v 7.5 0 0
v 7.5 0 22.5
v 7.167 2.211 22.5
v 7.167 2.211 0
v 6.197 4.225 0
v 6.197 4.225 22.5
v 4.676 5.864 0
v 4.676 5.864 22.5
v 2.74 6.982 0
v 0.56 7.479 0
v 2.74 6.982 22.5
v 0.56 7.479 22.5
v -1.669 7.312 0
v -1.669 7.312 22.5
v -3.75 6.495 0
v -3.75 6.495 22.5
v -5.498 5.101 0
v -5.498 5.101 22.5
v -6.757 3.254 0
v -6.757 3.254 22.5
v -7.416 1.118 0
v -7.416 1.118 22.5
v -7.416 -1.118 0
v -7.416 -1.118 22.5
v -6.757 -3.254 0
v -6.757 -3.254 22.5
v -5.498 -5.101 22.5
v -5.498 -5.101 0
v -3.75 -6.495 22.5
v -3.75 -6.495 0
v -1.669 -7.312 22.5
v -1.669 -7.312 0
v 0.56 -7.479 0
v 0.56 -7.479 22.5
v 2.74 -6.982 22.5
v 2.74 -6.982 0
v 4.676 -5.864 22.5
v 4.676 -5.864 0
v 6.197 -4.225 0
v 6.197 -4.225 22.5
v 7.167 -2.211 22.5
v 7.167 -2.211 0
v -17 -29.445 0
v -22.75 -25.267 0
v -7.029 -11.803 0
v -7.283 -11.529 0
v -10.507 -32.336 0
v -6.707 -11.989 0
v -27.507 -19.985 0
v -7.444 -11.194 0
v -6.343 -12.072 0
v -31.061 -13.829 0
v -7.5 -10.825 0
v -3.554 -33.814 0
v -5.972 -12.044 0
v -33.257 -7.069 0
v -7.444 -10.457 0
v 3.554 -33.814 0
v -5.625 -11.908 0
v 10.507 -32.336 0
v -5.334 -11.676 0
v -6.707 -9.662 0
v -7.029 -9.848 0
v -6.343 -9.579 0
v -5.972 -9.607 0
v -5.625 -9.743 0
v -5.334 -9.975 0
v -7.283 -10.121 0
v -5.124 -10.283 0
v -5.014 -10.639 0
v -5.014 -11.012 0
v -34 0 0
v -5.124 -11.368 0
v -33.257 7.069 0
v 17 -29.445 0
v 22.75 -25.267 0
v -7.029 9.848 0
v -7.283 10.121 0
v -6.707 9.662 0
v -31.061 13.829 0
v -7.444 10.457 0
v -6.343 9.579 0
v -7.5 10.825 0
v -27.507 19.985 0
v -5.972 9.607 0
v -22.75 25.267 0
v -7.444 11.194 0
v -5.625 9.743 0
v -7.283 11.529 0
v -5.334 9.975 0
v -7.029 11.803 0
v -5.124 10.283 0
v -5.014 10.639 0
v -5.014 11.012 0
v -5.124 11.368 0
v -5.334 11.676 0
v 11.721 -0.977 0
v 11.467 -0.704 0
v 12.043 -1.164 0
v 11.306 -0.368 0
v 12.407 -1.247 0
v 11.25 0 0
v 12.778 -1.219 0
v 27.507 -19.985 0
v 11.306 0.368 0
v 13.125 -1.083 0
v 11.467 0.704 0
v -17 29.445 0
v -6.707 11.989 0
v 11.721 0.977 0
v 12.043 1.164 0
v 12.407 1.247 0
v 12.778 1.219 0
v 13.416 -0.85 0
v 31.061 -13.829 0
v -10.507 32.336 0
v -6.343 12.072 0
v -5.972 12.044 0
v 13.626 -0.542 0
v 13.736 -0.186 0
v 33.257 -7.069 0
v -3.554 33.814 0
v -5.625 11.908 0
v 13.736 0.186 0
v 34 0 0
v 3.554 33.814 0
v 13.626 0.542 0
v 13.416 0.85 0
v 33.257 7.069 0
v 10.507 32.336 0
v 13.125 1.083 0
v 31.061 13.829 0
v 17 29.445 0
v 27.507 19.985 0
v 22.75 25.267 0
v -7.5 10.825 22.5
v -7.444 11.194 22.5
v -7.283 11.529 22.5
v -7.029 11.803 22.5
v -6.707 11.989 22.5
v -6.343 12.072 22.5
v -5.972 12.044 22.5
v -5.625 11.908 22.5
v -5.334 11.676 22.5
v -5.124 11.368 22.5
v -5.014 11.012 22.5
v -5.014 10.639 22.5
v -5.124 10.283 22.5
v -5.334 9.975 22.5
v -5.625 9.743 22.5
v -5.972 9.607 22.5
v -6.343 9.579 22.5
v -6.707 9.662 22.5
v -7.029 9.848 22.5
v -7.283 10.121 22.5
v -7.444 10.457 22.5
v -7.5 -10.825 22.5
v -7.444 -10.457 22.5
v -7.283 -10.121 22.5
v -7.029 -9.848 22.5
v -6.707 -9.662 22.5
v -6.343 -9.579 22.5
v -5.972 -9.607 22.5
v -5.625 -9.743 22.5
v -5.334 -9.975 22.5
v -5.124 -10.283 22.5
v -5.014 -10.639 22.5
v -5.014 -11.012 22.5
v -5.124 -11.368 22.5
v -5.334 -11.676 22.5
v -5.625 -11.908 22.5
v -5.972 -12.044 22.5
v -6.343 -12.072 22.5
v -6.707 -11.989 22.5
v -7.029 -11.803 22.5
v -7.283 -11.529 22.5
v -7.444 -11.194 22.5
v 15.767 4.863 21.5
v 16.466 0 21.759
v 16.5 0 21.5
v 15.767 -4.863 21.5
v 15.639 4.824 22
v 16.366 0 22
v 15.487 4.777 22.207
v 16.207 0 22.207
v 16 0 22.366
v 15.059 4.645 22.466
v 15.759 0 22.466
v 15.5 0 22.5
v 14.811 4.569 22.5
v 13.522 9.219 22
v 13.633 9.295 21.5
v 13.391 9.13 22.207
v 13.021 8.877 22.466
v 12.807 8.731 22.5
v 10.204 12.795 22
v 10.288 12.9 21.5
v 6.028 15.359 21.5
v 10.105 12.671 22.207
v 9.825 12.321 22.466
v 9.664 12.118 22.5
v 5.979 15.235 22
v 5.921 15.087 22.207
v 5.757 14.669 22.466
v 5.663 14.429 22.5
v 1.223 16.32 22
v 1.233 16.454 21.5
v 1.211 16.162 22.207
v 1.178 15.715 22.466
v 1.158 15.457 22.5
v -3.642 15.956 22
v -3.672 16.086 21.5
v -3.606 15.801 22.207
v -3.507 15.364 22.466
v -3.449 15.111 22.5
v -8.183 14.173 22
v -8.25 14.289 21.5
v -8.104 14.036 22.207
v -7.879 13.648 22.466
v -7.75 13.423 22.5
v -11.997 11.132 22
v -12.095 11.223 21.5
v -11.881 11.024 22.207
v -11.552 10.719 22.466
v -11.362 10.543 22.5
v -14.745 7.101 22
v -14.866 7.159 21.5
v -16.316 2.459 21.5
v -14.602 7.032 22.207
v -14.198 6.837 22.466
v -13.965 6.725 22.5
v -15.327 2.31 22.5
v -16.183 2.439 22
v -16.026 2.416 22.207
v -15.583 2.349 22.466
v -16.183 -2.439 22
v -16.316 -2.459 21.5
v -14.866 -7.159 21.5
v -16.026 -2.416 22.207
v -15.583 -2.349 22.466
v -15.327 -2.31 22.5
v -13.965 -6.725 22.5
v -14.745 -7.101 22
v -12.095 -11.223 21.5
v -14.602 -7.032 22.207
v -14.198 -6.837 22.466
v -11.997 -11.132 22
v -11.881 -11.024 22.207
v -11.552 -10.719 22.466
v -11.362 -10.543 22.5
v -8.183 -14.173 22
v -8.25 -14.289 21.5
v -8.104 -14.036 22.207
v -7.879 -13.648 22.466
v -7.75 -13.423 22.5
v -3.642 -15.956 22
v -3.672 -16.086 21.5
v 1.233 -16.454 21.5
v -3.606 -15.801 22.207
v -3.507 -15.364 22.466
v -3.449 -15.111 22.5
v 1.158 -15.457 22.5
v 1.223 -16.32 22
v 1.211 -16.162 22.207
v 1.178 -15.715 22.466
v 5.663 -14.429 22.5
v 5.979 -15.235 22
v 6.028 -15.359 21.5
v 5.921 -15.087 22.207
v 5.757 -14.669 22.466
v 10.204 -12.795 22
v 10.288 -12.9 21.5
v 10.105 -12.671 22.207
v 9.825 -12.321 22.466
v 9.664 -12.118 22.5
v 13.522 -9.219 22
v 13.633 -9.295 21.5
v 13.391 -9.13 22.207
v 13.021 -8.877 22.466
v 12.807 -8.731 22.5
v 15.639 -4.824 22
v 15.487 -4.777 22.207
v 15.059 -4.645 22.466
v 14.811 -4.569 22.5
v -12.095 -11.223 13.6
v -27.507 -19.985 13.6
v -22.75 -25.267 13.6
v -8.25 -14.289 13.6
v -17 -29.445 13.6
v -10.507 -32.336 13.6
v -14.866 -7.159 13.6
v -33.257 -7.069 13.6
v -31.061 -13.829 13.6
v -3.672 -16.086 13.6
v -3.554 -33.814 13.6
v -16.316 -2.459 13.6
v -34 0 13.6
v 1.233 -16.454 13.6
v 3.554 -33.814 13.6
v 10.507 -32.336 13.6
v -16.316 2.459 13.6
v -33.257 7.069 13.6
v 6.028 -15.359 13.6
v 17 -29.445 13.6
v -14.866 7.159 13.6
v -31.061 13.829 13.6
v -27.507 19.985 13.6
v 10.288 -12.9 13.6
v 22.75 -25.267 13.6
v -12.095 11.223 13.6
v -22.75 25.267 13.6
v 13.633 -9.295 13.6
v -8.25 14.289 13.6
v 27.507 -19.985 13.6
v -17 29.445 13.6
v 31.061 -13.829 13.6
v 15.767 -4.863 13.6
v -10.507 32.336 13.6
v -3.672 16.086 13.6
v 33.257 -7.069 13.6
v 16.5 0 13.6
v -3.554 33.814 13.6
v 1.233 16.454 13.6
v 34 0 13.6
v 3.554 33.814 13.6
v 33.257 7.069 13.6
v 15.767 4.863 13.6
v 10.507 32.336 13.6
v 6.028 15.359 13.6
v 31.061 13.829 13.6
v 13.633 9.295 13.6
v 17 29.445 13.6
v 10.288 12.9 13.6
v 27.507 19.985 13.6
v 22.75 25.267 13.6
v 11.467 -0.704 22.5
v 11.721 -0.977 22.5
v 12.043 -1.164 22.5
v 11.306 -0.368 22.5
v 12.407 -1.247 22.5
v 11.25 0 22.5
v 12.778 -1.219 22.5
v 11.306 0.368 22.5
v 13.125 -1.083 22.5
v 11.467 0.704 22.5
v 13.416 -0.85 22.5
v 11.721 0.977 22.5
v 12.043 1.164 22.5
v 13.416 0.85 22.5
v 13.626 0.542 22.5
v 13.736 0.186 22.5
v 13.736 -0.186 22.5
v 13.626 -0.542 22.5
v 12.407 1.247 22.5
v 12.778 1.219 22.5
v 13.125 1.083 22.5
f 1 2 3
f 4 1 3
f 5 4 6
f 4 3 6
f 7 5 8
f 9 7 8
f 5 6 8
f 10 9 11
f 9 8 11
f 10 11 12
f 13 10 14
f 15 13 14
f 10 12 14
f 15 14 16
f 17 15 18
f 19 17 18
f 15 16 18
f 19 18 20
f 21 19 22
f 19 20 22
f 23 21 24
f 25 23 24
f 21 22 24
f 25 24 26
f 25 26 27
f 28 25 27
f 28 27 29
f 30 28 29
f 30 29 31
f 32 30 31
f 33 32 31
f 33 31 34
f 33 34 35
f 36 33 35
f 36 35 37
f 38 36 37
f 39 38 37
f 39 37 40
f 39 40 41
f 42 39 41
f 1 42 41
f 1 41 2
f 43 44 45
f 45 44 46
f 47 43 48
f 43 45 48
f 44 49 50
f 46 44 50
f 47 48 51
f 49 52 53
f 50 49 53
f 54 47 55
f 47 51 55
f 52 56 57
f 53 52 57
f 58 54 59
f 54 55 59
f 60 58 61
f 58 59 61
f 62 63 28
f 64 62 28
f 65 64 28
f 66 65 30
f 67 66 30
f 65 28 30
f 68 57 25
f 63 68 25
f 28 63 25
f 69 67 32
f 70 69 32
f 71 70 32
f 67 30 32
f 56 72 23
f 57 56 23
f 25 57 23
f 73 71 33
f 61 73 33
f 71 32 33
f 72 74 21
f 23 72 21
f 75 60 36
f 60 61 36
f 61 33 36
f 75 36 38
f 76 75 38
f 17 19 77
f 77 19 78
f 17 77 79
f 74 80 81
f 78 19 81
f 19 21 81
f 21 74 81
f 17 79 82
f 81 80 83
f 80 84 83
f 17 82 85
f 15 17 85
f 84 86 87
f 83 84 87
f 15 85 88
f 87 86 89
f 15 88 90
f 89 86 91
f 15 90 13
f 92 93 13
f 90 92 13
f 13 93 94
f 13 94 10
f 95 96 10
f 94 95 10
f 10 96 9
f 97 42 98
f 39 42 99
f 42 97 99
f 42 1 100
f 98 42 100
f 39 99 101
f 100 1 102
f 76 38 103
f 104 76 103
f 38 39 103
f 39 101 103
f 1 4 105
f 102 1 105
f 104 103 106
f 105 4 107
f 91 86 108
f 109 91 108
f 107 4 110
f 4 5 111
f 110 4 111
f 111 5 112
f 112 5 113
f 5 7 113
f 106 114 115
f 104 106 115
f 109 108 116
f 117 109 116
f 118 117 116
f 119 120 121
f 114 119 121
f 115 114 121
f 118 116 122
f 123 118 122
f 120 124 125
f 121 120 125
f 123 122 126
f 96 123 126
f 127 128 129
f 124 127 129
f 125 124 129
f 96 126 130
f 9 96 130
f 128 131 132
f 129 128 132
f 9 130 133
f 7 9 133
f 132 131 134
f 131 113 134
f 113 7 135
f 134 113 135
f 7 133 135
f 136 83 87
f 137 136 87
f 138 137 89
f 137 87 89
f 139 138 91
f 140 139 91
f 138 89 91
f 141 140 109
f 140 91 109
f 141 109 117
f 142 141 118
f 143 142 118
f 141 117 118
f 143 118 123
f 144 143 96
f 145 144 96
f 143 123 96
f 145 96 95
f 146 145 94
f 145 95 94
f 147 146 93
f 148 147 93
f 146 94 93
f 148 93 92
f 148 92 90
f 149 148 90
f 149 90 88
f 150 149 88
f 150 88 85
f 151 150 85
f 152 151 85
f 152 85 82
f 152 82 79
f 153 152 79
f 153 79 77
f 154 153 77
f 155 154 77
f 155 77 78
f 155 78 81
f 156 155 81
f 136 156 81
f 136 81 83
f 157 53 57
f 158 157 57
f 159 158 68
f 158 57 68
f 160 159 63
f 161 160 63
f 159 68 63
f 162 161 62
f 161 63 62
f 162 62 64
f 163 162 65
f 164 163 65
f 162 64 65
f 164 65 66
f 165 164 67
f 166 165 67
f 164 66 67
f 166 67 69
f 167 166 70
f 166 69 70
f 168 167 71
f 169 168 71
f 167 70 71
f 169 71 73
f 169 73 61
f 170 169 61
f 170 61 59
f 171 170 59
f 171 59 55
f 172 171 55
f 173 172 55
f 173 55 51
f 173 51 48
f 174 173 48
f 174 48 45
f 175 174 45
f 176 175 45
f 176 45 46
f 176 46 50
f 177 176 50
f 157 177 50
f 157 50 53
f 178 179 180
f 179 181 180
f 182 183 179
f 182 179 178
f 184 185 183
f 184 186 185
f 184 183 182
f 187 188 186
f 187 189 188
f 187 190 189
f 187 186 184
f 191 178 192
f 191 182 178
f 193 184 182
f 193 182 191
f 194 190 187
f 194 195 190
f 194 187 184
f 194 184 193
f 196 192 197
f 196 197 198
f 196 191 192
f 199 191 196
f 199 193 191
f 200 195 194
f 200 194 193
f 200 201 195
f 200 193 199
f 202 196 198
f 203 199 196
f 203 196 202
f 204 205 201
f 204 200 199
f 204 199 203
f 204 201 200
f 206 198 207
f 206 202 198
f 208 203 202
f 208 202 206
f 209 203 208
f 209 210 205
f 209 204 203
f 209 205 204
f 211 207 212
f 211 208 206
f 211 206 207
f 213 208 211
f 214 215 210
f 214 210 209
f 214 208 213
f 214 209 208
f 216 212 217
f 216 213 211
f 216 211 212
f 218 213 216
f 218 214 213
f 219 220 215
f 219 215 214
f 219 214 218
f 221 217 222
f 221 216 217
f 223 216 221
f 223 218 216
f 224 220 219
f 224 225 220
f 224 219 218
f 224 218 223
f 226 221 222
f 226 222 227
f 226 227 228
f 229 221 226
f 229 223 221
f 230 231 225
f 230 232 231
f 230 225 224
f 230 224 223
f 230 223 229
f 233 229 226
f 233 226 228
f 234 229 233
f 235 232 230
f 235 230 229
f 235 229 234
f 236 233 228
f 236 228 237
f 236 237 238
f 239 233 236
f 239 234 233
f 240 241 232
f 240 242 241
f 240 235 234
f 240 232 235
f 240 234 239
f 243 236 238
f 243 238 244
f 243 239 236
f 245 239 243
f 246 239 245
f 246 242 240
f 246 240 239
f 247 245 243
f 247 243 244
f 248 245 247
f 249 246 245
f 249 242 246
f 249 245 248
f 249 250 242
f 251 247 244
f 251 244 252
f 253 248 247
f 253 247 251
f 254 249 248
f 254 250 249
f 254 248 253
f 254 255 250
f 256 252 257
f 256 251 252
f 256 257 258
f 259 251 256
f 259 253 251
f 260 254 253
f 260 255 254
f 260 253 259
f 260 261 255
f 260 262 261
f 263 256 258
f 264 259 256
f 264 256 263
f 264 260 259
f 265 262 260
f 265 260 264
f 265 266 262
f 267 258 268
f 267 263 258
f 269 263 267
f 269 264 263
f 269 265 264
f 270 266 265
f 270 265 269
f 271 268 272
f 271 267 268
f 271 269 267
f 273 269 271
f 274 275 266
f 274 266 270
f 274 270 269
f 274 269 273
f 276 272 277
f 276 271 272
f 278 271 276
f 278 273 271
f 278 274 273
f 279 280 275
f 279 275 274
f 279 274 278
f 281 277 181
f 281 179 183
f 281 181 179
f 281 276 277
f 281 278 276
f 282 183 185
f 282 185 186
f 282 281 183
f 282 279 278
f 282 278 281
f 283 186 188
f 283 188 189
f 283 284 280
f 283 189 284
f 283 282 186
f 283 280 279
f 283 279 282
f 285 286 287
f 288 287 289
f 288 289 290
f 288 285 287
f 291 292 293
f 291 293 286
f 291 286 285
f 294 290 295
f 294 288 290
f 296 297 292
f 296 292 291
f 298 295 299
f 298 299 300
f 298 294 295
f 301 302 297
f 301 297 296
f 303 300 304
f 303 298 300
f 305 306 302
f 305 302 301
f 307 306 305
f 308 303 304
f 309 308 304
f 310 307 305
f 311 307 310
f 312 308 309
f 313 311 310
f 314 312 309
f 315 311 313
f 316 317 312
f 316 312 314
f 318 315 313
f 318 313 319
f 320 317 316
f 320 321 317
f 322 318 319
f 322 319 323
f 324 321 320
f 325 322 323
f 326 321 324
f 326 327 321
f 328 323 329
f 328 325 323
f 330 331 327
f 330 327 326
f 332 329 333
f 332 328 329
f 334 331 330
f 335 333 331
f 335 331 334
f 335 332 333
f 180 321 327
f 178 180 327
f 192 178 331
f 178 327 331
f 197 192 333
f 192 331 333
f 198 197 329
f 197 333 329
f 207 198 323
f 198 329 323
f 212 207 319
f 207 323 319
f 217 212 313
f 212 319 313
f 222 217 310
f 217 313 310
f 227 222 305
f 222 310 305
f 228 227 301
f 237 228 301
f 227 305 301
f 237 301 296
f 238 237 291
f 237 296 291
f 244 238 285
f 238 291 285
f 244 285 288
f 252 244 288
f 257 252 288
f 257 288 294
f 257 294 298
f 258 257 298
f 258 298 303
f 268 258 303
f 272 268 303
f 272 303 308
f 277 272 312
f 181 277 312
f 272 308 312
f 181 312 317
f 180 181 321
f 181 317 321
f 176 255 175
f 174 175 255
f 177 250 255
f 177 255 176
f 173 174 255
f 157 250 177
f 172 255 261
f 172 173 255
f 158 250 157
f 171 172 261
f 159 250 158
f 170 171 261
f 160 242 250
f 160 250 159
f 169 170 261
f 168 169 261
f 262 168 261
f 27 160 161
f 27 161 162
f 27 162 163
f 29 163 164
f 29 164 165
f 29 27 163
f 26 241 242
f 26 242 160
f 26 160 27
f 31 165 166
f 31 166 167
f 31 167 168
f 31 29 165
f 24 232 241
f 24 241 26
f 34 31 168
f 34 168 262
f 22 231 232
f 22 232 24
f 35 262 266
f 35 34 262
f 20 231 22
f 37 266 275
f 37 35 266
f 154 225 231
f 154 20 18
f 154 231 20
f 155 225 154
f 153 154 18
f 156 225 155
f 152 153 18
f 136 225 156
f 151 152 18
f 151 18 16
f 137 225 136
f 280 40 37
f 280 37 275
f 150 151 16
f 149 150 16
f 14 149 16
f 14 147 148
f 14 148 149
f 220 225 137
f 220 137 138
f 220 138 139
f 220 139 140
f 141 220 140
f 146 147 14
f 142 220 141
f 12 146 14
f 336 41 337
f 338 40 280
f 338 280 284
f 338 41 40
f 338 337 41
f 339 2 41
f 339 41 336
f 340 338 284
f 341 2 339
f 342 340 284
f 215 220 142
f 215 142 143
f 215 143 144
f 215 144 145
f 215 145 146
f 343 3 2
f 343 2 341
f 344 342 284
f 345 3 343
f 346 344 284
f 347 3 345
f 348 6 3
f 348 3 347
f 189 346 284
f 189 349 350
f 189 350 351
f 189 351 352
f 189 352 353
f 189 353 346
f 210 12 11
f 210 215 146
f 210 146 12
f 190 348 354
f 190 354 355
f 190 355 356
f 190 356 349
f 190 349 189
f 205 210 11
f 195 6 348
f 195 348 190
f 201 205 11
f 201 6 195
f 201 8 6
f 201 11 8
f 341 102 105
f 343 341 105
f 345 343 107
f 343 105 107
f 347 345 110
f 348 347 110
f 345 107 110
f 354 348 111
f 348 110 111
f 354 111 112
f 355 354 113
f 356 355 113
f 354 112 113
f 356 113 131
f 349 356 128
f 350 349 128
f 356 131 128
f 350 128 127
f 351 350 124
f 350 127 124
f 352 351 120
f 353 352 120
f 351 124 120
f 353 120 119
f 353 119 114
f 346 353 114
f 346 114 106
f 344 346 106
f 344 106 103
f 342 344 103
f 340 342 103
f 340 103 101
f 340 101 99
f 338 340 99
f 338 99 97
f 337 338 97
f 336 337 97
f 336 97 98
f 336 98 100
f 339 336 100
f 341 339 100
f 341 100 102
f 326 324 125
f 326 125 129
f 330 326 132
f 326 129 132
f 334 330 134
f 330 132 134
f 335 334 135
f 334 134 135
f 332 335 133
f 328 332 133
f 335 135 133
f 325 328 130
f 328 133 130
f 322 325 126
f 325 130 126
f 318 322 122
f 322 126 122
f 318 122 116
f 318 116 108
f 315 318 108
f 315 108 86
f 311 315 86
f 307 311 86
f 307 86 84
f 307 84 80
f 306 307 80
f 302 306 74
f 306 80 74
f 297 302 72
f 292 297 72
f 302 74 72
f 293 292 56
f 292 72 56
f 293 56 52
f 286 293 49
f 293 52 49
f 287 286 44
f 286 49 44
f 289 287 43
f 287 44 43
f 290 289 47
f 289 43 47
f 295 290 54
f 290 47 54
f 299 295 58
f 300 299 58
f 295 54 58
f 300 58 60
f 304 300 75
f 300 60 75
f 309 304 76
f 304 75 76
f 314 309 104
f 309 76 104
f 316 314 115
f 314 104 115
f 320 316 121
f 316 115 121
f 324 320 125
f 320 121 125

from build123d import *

# Parameters (mm, degrees)
SKETCH_1_R          = 34
EXTRUDE_1_DEPTH     = 13.6
SKETCH_2_R          = 16.5
EXTRUDE_2_DEPTH     = 8.9
FILLET_1_R          = 1
SKETCH_3_R          = 4
CUT_EXTRUDE_1_DEPTH = 54.087192429
SKETCH_4_R          = 7.5
CUT_EXTRUDE_2_DEPTH = 54.087192429
M3X0_52_D           = 2.5


with BuildPart() as part:
    # Эскиз1 → Бобышка-Вытянуть1 (new body)
    with BuildSketch(Plane.XY):
        Circle(SKETCH_1_R)
    extrude(amount=EXTRUDE_1_DEPTH)

    # Эскиз2 → Бобышка-Вытянуть2 (add)
    with BuildSketch(Plane.XY.offset(13.6)):
        Circle(SKETCH_2_R)
    extrude(amount=EXTRUDE_2_DEPTH)

    # Скругление1
    fillet_1_edges = [part.edges().sort_by_distance(p)[0] for p in [
        (-16.5, 0, 22.5),
    ]]
    fillet(fillet_1_edges, radius=FILLET_1_R)

    # Эскиз3 → Вырез-Вытянуть1 (cut, through all)
    with BuildSketch(Plane(origin=(0, 0, 0), x_dir=(-1, 0, 0), z_dir=(0, 0, -1))):
        Circle(SKETCH_3_R)
    extrude(amount=-CUT_EXTRUDE_1_DEPTH, mode=Mode.SUBTRACT)

    # Эскиз4 → Вырез-Вытянуть2 (cut, through all)
    with BuildSketch(Plane.XY.offset(22.5)):
        Circle(SKETCH_4_R)
    extrude(amount=-CUT_EXTRUDE_2_DEPTH, mode=Mode.SUBTRACT)

    # Отверстие обработанное метчиком M3x0.52 (through all)
    with Locations(Plane.XY.offset(22.5)):
        with Locations((-6.25, 10.825317547), (-6.25, -10.825317547), (12.5, 0)):
            Hole(M3X0_52_D / 2)


solid = part.part
